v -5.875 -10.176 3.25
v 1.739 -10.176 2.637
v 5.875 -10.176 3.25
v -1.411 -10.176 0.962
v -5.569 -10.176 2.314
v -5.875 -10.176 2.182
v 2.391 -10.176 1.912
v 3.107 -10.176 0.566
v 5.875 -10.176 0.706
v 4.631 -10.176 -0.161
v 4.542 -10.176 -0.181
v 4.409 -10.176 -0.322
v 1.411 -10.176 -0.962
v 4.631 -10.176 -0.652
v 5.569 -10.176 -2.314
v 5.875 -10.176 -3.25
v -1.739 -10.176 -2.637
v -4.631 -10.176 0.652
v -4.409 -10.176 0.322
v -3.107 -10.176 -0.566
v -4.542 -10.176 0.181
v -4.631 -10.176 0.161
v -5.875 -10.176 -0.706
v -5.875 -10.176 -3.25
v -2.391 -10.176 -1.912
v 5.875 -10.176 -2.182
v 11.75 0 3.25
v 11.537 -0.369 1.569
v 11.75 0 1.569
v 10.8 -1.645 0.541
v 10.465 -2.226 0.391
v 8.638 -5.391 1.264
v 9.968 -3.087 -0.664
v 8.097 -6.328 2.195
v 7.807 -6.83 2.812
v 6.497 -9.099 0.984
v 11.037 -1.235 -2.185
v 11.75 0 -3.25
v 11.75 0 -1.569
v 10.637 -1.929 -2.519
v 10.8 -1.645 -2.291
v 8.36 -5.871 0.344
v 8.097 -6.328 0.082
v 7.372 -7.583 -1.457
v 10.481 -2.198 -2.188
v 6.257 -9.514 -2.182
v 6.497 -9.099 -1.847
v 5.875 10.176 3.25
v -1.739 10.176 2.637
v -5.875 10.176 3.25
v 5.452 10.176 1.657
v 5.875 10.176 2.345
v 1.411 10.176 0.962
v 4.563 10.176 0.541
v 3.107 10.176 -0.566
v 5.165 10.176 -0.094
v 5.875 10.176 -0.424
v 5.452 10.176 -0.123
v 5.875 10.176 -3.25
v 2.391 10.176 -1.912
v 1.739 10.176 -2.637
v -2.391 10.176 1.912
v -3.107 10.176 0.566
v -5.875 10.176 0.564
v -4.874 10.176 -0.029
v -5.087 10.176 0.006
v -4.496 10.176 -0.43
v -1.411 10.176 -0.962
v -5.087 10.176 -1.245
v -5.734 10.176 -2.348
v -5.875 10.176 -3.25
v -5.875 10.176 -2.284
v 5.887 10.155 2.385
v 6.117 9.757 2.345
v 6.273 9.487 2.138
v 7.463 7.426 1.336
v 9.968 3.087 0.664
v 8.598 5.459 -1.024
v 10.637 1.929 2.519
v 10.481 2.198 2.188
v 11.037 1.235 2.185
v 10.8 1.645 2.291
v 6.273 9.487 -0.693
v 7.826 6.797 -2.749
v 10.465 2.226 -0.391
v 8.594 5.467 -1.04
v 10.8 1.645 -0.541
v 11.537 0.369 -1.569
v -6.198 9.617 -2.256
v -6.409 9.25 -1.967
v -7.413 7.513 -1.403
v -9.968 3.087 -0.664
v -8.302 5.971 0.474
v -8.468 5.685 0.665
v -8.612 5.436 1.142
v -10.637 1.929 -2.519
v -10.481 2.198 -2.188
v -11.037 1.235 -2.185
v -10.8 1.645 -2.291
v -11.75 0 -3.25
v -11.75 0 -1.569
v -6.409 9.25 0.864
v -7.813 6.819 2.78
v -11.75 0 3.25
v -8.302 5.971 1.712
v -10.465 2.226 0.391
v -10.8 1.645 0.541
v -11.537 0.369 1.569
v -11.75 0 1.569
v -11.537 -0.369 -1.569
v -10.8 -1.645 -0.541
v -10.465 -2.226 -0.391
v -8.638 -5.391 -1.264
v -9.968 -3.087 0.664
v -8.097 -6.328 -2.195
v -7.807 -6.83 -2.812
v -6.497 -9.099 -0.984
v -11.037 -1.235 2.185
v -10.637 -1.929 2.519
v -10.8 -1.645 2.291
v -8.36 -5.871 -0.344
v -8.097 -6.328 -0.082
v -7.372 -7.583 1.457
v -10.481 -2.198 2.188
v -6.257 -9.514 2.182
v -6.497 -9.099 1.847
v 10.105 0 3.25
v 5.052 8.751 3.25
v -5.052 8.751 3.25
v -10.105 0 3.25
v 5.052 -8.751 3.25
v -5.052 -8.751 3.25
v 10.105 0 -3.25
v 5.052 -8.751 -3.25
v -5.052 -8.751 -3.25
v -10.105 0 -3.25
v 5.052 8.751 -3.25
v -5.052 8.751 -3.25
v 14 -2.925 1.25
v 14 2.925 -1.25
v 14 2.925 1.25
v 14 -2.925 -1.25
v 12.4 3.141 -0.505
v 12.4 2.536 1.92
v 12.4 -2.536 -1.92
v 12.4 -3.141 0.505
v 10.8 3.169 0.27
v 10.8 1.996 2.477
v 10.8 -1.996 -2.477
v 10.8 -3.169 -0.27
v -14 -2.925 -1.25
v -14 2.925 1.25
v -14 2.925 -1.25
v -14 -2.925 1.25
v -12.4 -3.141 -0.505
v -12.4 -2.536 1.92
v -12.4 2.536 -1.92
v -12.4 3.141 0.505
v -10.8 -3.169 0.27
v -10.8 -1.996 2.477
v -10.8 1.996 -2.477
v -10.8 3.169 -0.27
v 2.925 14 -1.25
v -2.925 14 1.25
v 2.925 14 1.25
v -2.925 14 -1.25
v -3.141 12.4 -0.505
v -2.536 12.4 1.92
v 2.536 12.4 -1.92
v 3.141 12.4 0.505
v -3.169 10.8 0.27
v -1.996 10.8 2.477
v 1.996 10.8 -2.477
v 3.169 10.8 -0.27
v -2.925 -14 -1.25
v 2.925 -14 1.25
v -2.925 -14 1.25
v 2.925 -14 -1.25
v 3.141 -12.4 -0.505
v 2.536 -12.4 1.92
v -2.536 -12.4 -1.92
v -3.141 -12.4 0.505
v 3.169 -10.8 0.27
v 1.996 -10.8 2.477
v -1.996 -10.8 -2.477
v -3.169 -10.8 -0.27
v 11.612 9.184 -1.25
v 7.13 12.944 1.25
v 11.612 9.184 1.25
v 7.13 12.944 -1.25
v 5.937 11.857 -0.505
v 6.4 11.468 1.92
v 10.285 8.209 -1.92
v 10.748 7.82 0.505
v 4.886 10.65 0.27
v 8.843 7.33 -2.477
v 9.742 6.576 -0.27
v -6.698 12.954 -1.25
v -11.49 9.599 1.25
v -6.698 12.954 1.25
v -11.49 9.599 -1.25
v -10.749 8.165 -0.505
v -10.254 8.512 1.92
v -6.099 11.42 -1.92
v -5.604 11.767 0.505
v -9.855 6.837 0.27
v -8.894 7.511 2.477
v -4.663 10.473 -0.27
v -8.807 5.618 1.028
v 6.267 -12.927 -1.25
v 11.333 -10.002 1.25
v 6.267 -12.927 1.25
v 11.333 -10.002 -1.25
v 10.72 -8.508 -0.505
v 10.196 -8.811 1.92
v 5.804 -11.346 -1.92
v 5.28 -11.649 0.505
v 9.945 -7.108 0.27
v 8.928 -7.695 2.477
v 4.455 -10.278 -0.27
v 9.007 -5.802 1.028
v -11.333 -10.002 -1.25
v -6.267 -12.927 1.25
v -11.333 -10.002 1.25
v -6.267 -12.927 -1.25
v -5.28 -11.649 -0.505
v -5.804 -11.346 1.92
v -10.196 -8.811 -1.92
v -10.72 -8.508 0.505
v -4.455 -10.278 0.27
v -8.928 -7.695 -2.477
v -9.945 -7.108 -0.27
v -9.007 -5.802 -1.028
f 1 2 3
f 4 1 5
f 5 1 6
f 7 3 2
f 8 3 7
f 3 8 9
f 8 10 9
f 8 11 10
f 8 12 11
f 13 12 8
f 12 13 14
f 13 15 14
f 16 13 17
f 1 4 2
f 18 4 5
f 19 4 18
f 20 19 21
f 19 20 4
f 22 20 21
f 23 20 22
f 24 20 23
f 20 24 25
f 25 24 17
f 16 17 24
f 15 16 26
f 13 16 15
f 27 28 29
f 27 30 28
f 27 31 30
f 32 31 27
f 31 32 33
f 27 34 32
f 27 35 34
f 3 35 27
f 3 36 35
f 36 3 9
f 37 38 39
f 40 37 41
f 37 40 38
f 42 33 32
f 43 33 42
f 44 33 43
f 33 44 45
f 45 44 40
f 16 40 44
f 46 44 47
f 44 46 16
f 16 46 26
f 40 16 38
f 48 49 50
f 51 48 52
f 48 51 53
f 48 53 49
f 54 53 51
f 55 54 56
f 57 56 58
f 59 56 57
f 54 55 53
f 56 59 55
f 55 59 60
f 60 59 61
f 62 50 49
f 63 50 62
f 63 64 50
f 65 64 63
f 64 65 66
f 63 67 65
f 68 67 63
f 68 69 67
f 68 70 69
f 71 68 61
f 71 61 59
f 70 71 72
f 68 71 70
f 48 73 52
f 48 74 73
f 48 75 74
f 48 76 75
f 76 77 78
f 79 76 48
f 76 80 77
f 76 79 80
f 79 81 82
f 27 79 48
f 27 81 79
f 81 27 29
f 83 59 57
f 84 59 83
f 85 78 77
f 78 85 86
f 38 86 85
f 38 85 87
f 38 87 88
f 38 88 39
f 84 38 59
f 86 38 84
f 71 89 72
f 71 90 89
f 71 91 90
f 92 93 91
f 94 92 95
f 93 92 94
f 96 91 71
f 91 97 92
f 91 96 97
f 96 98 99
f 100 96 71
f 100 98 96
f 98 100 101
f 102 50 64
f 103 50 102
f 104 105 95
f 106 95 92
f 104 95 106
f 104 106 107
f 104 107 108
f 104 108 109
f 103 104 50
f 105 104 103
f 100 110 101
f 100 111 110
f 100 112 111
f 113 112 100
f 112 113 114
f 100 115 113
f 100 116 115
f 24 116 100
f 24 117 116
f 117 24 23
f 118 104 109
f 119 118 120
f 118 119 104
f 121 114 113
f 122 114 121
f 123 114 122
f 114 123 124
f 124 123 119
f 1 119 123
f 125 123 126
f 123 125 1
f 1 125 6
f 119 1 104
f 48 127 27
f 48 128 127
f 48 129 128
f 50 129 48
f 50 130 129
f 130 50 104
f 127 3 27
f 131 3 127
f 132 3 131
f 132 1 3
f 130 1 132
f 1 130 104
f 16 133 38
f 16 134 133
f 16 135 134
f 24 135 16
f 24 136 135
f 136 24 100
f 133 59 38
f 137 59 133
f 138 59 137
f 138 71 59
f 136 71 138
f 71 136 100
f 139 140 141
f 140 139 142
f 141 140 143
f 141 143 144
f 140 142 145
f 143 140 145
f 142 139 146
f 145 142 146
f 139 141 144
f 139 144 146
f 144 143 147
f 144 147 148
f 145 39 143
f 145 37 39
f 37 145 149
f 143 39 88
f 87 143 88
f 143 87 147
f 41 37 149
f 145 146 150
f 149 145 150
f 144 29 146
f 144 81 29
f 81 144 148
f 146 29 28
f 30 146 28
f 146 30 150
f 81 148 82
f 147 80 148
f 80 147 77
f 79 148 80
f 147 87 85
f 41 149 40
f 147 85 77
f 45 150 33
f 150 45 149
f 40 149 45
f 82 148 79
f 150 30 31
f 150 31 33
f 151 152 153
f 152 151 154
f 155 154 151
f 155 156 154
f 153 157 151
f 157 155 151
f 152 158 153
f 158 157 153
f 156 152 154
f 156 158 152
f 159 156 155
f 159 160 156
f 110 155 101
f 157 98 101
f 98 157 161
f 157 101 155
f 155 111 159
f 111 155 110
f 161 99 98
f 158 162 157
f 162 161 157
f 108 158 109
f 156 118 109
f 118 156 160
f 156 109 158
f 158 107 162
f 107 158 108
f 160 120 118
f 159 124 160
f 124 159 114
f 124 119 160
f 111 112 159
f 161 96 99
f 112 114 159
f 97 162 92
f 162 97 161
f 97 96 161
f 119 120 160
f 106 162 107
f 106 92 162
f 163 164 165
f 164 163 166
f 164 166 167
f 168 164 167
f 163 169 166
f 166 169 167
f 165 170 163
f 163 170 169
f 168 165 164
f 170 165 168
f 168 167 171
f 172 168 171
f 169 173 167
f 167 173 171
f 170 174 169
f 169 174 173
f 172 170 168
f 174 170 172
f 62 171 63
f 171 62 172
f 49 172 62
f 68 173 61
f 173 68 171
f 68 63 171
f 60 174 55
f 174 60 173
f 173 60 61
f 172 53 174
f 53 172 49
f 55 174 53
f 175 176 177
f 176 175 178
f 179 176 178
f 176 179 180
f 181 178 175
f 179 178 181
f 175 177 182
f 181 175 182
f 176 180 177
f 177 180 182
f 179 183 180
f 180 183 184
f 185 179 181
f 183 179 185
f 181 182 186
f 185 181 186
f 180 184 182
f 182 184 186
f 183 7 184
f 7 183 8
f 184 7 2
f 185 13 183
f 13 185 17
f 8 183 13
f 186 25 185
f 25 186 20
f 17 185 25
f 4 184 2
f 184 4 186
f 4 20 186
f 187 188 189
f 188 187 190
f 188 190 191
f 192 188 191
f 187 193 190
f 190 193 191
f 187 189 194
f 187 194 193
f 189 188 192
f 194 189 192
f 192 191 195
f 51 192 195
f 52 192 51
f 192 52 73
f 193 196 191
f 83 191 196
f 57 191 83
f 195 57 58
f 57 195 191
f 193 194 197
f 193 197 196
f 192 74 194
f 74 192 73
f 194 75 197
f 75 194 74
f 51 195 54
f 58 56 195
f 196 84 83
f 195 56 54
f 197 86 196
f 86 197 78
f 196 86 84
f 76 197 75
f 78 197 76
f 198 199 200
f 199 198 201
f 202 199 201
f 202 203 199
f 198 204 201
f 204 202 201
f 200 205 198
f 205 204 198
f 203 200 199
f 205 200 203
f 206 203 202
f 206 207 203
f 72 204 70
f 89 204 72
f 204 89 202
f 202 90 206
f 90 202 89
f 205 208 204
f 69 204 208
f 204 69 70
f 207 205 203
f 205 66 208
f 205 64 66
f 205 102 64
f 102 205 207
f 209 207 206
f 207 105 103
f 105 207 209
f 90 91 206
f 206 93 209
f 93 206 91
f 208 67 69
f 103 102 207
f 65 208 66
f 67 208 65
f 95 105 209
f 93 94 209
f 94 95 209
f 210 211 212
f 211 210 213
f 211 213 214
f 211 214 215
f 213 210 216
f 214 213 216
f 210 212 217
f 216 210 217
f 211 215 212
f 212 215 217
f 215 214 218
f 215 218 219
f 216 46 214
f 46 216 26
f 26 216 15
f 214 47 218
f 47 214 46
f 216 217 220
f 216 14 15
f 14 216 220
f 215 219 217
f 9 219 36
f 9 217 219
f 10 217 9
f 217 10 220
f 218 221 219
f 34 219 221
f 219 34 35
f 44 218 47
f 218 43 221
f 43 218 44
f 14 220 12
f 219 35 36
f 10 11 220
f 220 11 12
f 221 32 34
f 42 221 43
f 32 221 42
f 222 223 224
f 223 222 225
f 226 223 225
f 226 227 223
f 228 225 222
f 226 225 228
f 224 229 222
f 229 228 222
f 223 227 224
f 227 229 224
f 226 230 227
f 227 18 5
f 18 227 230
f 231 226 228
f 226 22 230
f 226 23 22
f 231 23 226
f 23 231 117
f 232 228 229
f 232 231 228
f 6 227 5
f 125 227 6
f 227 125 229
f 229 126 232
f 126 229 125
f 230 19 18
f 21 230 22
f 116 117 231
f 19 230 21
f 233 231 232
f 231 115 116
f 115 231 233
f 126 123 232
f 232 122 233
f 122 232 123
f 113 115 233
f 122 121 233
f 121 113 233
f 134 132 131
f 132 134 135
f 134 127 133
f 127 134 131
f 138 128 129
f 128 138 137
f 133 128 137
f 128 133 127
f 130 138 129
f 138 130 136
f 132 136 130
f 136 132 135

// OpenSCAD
spindleD = 23.5;
spindleH = 6.5;
bladeLength = 8;

module fanNut() {
    cylinder(d=spindleD, h= spindleH, $fn=6, center=true);
}

module fanNutHole() {
    cylinder(d=spindleD*0.86, h= spindleH*2, $fn=6, center=true);
}

module fanBlade() {
linear_extrude(height = bladeLength, center = true, convexity = 10, twist = 70) square([2.5, spindleH*.9], center=true);
}

module fanBlades() {
union() {
fanNut();
translate([bladeLength*1.25,0,0])rotate(a=[0,90,180]) fanBlade();
translate([-bladeLength*1.25,0,0])rotate(a=[0,90,0]) fanBlade();
translate([0,bladeLength*1.25,0])rotate(a=[90,90,0]) fanBlade();
translate([0,-bladeLength*1.25,0])rotate(a=[90,90,180]) fanBlade();
    
// middle blades

translate([bladeLength*0.85,bladeLength*1,0])rotate(a=[-50,90,180]) fanBlade();
translate([-bladeLength*0.85,bladeLength*1,0])rotate(a=[55,90,0]) fanBlade();
translate([bladeLength*0.85,-bladeLength*1,0])rotate(a=[60,90,180]) fanBlade();
translate([-bladeLength*0.85,-bladeLength*1,0])rotate(a=[-60,90,0]) fanBlade();
    }
}

module fan() {
difference() {
    fanBlades();
    fanNutHole();
    }
}

fan();
    
